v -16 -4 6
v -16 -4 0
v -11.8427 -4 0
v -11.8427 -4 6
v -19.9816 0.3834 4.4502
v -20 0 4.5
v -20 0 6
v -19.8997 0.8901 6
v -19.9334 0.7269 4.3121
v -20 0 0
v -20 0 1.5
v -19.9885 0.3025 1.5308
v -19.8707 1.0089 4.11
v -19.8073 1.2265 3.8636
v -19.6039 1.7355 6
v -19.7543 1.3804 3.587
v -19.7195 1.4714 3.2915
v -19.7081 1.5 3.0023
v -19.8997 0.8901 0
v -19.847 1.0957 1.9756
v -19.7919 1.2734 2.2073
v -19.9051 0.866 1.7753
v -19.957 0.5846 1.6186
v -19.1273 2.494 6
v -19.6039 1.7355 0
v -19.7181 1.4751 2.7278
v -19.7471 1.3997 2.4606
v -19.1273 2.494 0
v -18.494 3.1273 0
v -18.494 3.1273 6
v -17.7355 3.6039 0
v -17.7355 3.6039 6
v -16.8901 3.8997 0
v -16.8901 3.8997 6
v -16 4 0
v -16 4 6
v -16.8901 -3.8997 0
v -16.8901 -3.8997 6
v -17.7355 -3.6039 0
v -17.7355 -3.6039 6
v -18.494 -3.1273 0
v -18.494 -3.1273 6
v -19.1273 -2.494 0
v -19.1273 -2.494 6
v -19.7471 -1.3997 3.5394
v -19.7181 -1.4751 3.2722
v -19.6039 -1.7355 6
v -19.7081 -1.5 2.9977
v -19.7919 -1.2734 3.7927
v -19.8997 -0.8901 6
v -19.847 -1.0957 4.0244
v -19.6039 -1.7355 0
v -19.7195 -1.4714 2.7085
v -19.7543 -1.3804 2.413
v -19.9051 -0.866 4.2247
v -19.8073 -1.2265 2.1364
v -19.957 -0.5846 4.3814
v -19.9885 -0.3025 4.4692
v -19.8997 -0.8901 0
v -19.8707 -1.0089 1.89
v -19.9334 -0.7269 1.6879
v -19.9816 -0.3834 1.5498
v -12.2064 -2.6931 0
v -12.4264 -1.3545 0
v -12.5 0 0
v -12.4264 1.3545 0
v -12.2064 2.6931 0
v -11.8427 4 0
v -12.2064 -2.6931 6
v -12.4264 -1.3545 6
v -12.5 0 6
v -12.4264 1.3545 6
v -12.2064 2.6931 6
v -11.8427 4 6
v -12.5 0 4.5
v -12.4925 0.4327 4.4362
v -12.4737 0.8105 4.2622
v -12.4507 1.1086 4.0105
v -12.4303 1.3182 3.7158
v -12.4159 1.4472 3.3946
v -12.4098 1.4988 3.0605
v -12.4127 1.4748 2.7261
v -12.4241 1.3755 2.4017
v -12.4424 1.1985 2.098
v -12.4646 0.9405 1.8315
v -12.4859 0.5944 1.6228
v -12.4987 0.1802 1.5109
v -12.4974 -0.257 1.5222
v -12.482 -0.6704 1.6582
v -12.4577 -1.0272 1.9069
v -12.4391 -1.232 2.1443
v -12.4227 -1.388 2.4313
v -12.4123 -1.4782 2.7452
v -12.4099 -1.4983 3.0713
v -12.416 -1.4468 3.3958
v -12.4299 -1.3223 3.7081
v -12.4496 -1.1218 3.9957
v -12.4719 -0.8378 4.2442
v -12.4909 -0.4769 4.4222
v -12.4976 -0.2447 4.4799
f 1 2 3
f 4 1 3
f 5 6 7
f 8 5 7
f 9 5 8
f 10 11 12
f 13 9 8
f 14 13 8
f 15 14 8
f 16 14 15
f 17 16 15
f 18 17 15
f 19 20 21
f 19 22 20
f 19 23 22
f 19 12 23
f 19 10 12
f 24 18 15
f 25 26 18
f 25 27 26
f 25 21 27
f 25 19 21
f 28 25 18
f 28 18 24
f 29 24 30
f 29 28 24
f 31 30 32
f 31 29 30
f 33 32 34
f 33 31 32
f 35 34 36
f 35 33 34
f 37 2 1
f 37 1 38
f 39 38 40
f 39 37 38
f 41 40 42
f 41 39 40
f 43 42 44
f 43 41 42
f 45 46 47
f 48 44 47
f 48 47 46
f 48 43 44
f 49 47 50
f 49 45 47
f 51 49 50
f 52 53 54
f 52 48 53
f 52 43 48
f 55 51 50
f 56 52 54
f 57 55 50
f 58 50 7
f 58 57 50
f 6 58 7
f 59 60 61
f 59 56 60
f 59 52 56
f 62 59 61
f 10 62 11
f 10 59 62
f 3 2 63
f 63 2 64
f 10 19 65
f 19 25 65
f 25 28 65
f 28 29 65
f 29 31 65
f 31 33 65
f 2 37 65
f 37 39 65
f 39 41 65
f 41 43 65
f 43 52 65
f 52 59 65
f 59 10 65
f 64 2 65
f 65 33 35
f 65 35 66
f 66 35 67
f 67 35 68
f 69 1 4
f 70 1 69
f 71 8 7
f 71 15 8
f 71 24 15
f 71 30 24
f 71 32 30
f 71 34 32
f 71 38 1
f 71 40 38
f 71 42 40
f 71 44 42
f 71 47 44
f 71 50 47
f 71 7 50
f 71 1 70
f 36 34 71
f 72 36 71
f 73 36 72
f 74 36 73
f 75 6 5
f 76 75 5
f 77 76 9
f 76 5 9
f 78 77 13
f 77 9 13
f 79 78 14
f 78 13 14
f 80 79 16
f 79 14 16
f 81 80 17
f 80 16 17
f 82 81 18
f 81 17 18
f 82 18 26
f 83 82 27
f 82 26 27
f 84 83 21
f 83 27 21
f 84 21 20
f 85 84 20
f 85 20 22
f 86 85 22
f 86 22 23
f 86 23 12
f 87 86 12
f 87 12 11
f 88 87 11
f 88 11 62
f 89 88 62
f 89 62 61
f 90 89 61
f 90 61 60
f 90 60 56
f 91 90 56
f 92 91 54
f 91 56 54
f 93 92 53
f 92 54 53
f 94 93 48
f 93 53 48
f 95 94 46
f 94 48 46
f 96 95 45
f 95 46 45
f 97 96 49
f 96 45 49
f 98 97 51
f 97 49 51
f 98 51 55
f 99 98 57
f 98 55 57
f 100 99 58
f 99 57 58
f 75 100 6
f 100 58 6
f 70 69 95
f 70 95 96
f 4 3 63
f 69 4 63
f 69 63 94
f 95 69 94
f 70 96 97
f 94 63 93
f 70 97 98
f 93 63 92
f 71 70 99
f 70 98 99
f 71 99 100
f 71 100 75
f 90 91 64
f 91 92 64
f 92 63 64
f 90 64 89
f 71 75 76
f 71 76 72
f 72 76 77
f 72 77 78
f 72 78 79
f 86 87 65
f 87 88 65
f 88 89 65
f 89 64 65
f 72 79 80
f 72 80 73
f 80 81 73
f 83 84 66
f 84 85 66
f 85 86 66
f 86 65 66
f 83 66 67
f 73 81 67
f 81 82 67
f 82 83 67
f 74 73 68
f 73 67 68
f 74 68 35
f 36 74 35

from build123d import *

# Parameters (mm, degrees)
BOSS_EXTRUDE1_DEPTH = 6
SKETCH2_R           = 1.5
CUT_EXTRUDE1_DEPTH  = 10
FILLET1_DEPTH       = 6


with BuildPart() as part:
    # Sketch1 → Boss-Extrude1 (new body)
    with BuildSketch(Plane.XY):
        with BuildLine():
            Line((-11.842719282, 4), (-20, 4))
            Line((-20, 4), (-20, -4))
            Line((-20, -4), (-11.842719282, -4))
            ThreePointArc((-11.842719282, -4), (-12.5, 0), (-11.842719282, 4))
        make_face()
    extrude(amount=BOSS_EXTRUDE1_DEPTH)

    # Sketch2 → Cut-Extrude1 (cut)
    with BuildSketch(Plane.ZY.offset(20)):
        with Locations((3, 0)):
            Circle(SKETCH2_R)
    extrude(amount=-CUT_EXTRUDE1_DEPTH, mode=Mode.SUBTRACT)

    # Fillet1: read off the stored shape, not the designer's step
    # Fillet1 outline → Fillet1 (cut)
    with BuildSketch(Plane.XY):
        with BuildLine():
            Line((-20, -4), (-16, -4))
            ThreePointArc((-16, -4), (-18.828427125, -2.828427125), (-20, 0))
            Line((-20, 0), (-20, -4))
        make_face()
        with BuildLine():
            Line((-20, 4), (-20, 0))
            ThreePointArc((-20, 0), (-18.828427125, 2.828427125), (-16, 4))
            Line((-16, 4), (-20, 4))
        make_face()
    extrude(amount=FILLET1_DEPTH, mode=Mode.SUBTRACT)


solid = part.part
